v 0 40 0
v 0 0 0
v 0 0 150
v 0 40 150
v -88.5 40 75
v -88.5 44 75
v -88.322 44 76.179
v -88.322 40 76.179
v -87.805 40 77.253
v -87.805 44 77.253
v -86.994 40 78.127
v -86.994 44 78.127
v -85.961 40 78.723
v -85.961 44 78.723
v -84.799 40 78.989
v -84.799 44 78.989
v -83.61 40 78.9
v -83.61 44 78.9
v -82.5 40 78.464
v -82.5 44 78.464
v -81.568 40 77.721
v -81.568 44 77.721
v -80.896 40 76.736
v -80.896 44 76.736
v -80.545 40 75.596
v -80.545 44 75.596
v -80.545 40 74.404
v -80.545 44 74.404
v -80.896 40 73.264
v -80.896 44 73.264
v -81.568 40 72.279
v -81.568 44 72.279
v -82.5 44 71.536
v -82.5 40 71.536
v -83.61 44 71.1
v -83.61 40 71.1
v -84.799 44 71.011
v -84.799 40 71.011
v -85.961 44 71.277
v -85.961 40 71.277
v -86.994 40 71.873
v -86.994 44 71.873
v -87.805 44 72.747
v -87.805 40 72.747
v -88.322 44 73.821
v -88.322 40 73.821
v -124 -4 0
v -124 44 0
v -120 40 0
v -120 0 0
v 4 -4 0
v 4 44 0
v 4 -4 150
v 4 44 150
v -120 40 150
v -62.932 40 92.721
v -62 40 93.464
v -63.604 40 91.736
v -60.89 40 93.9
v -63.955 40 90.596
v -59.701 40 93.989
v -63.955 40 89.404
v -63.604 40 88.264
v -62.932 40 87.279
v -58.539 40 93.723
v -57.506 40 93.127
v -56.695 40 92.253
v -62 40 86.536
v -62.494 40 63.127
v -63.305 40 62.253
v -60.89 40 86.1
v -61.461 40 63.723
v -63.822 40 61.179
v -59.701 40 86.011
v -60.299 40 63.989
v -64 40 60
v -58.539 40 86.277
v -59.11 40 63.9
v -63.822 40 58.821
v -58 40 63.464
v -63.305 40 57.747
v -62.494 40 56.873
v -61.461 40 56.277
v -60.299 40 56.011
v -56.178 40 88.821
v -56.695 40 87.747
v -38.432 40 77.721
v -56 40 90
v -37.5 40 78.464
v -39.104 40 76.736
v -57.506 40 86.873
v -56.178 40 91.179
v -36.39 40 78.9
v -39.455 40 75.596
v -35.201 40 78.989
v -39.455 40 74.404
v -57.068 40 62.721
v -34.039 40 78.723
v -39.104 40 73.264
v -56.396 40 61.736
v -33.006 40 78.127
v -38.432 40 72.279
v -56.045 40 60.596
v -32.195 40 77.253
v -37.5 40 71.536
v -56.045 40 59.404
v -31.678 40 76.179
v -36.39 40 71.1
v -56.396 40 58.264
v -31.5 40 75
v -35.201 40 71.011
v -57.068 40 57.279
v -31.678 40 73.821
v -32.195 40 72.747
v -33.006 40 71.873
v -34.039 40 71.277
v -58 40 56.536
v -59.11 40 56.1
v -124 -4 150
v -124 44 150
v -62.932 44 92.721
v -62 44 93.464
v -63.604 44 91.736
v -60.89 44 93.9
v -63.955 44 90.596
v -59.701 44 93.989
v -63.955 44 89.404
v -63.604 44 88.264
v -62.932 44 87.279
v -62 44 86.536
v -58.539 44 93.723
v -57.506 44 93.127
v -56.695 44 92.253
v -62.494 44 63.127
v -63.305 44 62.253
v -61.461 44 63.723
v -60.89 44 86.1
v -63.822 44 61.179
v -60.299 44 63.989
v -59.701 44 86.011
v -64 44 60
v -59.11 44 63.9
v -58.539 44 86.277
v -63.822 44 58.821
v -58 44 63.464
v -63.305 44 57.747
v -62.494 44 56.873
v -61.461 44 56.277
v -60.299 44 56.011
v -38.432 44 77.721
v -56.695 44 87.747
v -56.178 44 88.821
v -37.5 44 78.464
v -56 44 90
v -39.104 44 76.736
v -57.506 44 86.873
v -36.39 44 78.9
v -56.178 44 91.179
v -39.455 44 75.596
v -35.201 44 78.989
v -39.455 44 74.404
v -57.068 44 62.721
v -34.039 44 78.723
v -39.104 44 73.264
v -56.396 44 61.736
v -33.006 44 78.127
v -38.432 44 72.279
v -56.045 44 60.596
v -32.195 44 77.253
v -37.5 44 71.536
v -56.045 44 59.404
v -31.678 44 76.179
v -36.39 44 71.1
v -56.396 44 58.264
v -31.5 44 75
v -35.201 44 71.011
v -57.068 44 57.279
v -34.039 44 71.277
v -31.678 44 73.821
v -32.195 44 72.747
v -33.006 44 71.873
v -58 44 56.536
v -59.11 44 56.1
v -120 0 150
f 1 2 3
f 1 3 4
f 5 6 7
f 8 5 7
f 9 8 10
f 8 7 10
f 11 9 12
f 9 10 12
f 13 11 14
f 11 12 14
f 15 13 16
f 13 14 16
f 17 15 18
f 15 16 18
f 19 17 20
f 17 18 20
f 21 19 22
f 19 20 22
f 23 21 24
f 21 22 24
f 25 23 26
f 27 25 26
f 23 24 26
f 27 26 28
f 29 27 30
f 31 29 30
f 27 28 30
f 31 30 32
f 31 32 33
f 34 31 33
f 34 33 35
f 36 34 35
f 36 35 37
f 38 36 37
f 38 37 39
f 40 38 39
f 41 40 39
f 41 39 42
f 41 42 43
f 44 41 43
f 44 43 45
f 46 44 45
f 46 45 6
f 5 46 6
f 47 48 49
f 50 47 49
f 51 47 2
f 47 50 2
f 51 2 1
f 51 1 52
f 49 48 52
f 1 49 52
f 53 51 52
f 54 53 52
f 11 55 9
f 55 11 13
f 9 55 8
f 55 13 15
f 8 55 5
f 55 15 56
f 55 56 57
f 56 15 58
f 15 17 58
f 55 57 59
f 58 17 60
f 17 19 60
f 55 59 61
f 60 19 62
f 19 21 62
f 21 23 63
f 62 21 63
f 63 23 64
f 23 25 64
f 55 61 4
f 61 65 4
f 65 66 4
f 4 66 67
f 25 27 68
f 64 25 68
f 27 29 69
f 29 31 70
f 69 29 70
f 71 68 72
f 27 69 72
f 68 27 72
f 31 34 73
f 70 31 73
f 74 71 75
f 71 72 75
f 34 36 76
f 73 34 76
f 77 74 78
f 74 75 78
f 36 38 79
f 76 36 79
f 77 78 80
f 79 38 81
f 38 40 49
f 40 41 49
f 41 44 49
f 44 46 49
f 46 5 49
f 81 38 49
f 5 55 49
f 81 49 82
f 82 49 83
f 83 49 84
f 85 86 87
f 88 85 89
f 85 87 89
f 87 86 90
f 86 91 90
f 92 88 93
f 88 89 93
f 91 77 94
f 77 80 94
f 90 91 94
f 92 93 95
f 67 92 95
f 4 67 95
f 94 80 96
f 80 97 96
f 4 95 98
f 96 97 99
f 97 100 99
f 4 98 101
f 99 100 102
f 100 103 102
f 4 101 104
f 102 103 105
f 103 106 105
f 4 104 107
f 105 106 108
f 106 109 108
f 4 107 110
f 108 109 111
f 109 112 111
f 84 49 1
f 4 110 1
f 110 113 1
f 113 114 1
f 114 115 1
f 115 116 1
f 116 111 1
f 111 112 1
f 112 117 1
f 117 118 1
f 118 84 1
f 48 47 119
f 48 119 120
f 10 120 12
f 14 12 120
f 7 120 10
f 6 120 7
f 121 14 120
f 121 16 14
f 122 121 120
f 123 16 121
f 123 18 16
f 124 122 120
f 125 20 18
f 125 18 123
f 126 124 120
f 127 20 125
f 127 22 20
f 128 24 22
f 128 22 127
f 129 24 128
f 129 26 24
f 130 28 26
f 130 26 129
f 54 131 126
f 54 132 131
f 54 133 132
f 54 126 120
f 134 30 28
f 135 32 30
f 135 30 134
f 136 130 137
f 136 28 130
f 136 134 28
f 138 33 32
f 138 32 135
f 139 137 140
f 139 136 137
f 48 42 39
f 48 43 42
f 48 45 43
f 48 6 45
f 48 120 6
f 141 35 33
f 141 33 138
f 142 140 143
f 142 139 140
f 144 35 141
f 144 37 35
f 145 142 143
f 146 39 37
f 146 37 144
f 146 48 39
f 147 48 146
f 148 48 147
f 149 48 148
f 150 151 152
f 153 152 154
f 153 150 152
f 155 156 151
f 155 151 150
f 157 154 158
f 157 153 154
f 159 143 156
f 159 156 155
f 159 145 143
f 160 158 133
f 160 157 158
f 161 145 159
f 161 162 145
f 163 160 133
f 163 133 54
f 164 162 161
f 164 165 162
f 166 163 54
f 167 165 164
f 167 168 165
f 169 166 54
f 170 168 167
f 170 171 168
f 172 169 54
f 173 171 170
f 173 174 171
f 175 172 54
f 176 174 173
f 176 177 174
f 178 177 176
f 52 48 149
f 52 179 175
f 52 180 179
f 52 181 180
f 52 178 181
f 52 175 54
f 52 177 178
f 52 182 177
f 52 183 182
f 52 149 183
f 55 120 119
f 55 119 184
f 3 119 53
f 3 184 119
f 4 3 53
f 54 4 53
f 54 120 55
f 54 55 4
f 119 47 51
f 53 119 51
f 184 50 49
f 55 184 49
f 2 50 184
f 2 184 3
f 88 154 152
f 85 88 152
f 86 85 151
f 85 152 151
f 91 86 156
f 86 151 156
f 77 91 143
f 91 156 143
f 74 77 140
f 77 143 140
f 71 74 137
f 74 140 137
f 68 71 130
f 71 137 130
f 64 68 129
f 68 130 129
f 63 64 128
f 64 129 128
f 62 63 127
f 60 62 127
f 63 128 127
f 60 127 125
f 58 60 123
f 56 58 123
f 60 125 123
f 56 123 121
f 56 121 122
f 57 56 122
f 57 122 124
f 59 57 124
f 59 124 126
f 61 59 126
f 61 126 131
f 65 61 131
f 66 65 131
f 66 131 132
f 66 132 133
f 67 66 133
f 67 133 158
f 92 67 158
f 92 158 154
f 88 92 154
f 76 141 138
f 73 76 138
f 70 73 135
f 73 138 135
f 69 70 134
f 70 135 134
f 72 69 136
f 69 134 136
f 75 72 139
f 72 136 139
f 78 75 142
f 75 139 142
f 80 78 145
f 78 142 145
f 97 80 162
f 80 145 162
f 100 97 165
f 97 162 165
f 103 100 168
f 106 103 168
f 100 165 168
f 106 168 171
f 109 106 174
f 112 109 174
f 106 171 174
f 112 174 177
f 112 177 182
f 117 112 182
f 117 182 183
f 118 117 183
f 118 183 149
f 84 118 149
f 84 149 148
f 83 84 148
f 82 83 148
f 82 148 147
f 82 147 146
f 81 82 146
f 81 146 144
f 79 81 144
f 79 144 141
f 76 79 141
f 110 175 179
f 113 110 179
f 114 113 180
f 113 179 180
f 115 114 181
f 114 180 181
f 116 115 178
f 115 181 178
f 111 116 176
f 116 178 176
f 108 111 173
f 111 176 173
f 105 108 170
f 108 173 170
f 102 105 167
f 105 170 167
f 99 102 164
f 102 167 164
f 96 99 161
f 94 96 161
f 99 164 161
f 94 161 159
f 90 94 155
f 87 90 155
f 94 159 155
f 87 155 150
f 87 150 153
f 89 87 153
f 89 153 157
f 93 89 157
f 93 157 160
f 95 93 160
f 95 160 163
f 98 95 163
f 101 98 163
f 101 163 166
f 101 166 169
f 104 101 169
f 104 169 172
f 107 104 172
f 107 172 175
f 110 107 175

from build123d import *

# Parameters (mm, degrees)
IZIM1_W               = 128
IZIM1_H               = 48
IZIM1_W_2             = 120
IZIM1_H_2             = 40
EKSTR_ZYON_NCE1_DEPTH = 150
KES_EKSTR_ZYON1_REACH = 202.449
IZIM2_R               = 4


with BuildPart() as part:
    # Çizim1 → Ekstrüzyon-İnce1 (new body)
    with BuildSketch(Plane.XY):
        with Locations((-60, 20)):
            Rectangle(IZIM1_W, IZIM1_H)
        with Locations((-60, 20)):
            Rectangle(IZIM1_W_2, IZIM1_H_2, mode=Mode.SUBTRACT)
    extrude(amount=EKSTR_ZYON_NCE1_DEPTH)

    # Çizim2 → Kes-Ekstrüzyon1 (cut, up to next)
    with BuildSketch(Plane(origin=(0, 44, 0), x_dir=(1, 0, 0), z_dir=(0, 1, 0)), mode=Mode.PRIVATE) as kes_ekstr_zyon1_sk1:
        with Locations(Location((-84.5, -75, 0), (0, 0, 180))):
            Circle(IZIM2_R)
    kes_ekstr_zyon1_tool1 = extrude(kes_ekstr_zyon1_sk1.sketch, amount=-KES_EKSTR_ZYON1_REACH, mode=Mode.PRIVATE) & part.part
    # Çizim2 → Kes-Ekstrüzyon1 (cut, up to next)
    with BuildSketch(Plane(origin=(0, 44, 0), x_dir=(1, 0, 0), z_dir=(0, 1, 0)), mode=Mode.PRIVATE) as kes_ekstr_zyon1_sk2:
        with Locations((-35.5, -75)):
            Circle(IZIM2_R)
    kes_ekstr_zyon1_tool2 = extrude(kes_ekstr_zyon1_sk2.sketch, amount=-KES_EKSTR_ZYON1_REACH, mode=Mode.PRIVATE) & part.part
    # Çizim2 → Kes-Ekstrüzyon1 (cut, up to next)
    with BuildSketch(Plane(origin=(0, 44, 0), x_dir=(1, 0, 0), z_dir=(0, 1, 0)), mode=Mode.PRIVATE) as kes_ekstr_zyon1_sk3:
        with Locations(Location((-60, -60, 0), (0, 0, 180))):
            Circle(IZIM2_R)
    kes_ekstr_zyon1_tool3 = extrude(kes_ekstr_zyon1_sk3.sketch, amount=-KES_EKSTR_ZYON1_REACH, mode=Mode.PRIVATE) & part.part
    # Çizim2 → Kes-Ekstrüzyon1 (cut, up to next)
    with BuildSketch(Plane(origin=(0, 44, 0), x_dir=(1, 0, 0), z_dir=(0, 1, 0)), mode=Mode.PRIVATE) as kes_ekstr_zyon1_sk4:
        with Locations((-60, -90)):
            Circle(IZIM2_R)
    kes_ekstr_zyon1_tool4 = extrude(kes_ekstr_zyon1_sk4.sketch, amount=-KES_EKSTR_ZYON1_REACH, mode=Mode.PRIVATE) & part.part
    add(kes_ekstr_zyon1_tool1.solids().sort_by_distance((-84.5, 44, 75))[0], mode=Mode.SUBTRACT)
    add(kes_ekstr_zyon1_tool2.solids().sort_by_distance((-35.5, 44, 75))[0], mode=Mode.SUBTRACT)
    add(kes_ekstr_zyon1_tool3.solids().sort_by_distance((-60, 44, 60))[0], mode=Mode.SUBTRACT)
    add(kes_ekstr_zyon1_tool4.solids().sort_by_distance((-60, 44, 90))[0], mode=Mode.SUBTRACT)


solid = part.part
